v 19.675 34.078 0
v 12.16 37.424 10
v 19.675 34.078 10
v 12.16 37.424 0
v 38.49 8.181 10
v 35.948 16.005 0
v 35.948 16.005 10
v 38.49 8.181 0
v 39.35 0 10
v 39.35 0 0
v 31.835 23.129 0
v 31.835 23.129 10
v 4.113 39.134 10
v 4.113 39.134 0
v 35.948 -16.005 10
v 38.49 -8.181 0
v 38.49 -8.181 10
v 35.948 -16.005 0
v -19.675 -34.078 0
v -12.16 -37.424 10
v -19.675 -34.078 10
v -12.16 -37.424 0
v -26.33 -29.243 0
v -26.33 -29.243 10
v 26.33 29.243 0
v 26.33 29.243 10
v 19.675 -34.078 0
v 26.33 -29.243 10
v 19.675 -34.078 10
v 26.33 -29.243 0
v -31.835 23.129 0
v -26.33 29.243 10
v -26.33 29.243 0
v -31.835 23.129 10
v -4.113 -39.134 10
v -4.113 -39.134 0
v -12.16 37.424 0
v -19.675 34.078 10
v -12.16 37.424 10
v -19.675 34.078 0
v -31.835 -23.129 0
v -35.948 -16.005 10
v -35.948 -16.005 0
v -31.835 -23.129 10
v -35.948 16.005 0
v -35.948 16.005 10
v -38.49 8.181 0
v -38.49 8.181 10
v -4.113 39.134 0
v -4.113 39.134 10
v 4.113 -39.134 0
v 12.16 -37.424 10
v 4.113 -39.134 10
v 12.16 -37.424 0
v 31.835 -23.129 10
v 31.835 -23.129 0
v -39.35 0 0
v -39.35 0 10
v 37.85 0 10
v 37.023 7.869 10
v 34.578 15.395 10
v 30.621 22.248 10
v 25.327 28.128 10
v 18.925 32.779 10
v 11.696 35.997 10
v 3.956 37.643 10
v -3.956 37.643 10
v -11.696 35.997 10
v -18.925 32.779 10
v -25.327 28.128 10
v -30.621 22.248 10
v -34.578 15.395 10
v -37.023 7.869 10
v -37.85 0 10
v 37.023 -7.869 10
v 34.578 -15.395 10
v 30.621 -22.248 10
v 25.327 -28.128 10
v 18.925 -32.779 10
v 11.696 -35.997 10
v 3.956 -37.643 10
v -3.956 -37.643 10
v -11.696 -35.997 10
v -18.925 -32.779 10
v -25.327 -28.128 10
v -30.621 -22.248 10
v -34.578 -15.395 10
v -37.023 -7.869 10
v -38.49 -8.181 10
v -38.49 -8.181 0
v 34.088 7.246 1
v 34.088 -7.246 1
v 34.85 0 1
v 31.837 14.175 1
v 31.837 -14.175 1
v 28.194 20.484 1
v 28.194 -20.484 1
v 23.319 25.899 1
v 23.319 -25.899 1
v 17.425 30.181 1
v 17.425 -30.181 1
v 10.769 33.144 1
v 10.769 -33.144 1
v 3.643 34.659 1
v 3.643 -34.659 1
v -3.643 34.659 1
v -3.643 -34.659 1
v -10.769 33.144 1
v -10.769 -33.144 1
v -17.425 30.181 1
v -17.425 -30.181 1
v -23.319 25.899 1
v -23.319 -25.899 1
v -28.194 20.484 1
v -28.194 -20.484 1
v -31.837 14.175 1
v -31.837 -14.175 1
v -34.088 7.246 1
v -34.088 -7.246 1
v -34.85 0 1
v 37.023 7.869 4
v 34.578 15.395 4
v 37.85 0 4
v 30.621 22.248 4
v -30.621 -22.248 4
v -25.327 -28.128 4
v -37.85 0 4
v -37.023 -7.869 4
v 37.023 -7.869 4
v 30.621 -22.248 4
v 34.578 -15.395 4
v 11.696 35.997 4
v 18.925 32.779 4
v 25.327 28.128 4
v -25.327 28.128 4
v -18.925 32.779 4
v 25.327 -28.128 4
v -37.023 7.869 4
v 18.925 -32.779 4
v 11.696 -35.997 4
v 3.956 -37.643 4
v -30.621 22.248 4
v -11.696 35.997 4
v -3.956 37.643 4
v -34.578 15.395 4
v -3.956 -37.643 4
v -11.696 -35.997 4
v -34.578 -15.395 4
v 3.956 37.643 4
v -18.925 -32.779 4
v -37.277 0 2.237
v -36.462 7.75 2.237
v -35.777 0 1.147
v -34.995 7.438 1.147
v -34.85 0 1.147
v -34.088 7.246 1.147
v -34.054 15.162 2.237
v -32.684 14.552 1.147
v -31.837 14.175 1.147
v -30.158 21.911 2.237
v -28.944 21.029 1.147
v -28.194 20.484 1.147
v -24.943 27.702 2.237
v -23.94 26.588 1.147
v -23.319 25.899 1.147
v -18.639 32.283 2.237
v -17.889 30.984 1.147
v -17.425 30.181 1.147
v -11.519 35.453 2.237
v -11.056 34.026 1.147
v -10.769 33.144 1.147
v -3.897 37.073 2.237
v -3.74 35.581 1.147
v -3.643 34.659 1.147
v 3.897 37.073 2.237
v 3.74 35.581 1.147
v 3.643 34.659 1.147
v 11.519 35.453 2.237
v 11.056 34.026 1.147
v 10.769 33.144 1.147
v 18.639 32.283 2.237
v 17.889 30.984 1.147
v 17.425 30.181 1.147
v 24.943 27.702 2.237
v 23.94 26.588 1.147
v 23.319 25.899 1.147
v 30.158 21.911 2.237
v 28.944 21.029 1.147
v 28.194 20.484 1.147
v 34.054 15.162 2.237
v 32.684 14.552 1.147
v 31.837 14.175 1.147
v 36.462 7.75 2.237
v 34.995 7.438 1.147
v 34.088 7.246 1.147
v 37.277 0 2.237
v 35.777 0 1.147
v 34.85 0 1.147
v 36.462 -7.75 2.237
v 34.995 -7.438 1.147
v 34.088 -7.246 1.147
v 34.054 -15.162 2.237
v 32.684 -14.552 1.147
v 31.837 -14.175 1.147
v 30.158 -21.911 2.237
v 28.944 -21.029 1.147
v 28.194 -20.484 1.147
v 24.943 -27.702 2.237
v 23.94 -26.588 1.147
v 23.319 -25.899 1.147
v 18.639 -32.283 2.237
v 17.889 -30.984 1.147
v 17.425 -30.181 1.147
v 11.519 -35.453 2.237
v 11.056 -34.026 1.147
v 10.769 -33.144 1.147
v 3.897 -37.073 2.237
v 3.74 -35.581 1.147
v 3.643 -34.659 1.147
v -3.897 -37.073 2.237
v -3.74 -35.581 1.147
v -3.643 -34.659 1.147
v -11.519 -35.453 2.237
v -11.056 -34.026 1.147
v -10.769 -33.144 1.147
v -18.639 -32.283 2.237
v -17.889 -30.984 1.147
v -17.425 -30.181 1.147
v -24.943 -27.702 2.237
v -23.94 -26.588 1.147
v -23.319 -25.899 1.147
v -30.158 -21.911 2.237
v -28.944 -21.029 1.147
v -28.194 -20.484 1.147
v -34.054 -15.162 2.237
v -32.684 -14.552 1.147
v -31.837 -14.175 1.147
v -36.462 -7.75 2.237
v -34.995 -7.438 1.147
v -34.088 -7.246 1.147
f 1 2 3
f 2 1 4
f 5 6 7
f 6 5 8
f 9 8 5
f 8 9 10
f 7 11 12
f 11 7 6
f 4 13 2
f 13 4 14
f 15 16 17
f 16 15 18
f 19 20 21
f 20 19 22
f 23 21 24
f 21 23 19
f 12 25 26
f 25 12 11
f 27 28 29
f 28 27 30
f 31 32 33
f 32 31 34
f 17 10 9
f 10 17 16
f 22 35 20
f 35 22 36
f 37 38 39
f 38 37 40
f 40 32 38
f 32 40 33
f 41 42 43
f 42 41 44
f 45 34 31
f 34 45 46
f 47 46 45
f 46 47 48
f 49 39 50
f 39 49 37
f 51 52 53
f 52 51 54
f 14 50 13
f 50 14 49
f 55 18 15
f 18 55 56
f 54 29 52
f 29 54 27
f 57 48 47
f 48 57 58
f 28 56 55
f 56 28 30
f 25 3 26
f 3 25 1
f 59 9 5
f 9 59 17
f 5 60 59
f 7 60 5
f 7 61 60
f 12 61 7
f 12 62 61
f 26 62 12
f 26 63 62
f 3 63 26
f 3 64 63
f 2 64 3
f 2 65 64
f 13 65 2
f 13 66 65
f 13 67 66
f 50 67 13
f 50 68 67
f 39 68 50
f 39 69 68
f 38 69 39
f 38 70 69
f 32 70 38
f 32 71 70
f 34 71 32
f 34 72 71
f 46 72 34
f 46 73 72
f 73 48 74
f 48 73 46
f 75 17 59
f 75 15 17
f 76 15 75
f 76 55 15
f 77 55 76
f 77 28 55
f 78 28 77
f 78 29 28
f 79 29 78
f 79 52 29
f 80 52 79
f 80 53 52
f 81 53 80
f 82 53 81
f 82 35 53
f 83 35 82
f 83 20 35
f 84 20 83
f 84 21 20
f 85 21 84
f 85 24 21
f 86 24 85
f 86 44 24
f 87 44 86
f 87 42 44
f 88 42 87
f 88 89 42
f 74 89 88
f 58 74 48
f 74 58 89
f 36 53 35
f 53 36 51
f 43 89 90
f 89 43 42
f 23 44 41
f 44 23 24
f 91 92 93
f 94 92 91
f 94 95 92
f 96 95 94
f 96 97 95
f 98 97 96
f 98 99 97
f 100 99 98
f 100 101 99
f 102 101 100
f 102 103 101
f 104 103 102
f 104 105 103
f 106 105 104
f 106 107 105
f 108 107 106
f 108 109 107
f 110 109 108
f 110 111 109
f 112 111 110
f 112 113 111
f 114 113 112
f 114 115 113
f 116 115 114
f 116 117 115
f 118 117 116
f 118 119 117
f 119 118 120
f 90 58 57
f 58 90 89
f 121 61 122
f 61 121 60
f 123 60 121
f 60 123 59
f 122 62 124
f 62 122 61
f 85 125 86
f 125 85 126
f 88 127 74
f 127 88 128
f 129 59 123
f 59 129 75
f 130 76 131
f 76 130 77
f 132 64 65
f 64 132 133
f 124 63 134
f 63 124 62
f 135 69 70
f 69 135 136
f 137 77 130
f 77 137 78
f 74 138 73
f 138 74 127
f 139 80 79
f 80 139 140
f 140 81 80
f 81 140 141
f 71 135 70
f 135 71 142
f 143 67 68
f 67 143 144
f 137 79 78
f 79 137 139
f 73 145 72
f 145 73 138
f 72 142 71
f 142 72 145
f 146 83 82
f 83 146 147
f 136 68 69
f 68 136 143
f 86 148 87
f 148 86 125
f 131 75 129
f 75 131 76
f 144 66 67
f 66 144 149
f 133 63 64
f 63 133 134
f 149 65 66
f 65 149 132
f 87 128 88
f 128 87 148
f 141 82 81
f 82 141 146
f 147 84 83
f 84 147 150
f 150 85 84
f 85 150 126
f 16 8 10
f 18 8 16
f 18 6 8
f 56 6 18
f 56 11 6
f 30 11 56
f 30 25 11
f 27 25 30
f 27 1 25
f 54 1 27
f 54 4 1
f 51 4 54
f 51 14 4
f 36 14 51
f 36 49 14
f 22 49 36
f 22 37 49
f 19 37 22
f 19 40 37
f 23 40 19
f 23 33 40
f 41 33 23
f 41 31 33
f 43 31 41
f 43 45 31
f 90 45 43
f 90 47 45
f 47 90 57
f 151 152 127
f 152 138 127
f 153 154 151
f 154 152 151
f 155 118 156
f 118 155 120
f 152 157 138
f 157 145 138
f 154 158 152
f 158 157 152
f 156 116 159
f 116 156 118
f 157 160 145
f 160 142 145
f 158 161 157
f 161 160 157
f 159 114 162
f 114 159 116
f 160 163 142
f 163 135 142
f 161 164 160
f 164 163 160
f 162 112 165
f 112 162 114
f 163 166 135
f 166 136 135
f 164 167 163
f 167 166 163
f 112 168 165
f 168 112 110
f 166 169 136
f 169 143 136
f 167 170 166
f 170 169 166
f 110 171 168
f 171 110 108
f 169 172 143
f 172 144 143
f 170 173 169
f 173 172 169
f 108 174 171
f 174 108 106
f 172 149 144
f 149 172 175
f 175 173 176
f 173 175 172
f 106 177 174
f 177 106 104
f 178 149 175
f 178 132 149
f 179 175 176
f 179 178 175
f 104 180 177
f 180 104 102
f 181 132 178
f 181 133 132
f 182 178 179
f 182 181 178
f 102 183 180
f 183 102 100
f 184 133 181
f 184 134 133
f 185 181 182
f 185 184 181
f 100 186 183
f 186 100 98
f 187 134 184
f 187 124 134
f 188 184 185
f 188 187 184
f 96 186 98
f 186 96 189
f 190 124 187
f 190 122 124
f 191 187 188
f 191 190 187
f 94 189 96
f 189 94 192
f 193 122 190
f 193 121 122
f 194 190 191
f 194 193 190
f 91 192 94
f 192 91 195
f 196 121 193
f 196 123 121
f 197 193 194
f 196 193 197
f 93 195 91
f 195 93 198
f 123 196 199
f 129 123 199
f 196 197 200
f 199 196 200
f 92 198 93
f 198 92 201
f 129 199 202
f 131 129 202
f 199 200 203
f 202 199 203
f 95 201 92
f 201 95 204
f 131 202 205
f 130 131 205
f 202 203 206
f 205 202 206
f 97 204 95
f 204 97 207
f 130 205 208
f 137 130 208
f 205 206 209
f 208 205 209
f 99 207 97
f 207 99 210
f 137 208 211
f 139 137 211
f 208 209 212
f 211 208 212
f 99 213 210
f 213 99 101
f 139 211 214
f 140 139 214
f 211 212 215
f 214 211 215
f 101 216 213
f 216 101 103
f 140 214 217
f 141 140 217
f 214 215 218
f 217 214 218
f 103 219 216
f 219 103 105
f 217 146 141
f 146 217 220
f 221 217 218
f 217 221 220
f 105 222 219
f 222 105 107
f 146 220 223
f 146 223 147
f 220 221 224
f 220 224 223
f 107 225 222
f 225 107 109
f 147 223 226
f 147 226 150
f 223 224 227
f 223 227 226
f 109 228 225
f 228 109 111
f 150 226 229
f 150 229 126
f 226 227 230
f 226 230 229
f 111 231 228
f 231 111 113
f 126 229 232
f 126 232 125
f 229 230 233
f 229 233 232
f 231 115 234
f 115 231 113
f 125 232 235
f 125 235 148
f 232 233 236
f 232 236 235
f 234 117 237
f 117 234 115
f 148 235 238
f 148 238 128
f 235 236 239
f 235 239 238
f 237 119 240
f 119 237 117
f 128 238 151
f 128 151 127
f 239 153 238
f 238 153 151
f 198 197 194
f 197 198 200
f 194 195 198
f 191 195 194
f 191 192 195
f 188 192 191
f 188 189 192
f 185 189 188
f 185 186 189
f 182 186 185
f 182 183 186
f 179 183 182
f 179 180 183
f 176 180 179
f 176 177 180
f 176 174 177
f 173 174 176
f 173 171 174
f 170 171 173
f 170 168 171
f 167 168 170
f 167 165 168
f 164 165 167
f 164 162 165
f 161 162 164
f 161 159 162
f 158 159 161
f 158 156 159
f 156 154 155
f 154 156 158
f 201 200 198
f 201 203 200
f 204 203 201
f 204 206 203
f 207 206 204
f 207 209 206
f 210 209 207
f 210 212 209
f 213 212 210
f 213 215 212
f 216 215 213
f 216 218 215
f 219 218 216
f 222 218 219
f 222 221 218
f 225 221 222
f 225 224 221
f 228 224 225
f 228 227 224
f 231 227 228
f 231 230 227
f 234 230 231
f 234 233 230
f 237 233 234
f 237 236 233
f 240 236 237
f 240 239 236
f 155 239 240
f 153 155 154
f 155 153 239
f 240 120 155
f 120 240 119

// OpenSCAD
// file: ../modules/lid.scad
module lid(
  hole_diameter,
  edge_height,
  inner_border = 0,
  base_height = 1,
  edge_thickness = 1
) {
  inner_radius = hole_diameter / 2;
  outer_radius = inner_radius + edge_thickness;

  cylinder(h = base_height, r = outer_radius);

  translate([ 0, 0, base_height ]) difference() {
    cylinder(h = edge_height, r = outer_radius);
    cylinder(h = edge_height + .01, r = hole_diameter / 2);
  }

  rotate_extrude() translate([inner_radius - inner_border, base_height]) difference() {
    square([inner_border, inner_border]);
    translate([0, inner_border]) circle(r = inner_border);
  }
}
// main file
use <../modules/lid.scad>

lid(
  hole_diameter = 75.7,
  edge_height = 9,
  inner_border = 3,
  base_height = 1,
  edge_thickness = 1.5
);
